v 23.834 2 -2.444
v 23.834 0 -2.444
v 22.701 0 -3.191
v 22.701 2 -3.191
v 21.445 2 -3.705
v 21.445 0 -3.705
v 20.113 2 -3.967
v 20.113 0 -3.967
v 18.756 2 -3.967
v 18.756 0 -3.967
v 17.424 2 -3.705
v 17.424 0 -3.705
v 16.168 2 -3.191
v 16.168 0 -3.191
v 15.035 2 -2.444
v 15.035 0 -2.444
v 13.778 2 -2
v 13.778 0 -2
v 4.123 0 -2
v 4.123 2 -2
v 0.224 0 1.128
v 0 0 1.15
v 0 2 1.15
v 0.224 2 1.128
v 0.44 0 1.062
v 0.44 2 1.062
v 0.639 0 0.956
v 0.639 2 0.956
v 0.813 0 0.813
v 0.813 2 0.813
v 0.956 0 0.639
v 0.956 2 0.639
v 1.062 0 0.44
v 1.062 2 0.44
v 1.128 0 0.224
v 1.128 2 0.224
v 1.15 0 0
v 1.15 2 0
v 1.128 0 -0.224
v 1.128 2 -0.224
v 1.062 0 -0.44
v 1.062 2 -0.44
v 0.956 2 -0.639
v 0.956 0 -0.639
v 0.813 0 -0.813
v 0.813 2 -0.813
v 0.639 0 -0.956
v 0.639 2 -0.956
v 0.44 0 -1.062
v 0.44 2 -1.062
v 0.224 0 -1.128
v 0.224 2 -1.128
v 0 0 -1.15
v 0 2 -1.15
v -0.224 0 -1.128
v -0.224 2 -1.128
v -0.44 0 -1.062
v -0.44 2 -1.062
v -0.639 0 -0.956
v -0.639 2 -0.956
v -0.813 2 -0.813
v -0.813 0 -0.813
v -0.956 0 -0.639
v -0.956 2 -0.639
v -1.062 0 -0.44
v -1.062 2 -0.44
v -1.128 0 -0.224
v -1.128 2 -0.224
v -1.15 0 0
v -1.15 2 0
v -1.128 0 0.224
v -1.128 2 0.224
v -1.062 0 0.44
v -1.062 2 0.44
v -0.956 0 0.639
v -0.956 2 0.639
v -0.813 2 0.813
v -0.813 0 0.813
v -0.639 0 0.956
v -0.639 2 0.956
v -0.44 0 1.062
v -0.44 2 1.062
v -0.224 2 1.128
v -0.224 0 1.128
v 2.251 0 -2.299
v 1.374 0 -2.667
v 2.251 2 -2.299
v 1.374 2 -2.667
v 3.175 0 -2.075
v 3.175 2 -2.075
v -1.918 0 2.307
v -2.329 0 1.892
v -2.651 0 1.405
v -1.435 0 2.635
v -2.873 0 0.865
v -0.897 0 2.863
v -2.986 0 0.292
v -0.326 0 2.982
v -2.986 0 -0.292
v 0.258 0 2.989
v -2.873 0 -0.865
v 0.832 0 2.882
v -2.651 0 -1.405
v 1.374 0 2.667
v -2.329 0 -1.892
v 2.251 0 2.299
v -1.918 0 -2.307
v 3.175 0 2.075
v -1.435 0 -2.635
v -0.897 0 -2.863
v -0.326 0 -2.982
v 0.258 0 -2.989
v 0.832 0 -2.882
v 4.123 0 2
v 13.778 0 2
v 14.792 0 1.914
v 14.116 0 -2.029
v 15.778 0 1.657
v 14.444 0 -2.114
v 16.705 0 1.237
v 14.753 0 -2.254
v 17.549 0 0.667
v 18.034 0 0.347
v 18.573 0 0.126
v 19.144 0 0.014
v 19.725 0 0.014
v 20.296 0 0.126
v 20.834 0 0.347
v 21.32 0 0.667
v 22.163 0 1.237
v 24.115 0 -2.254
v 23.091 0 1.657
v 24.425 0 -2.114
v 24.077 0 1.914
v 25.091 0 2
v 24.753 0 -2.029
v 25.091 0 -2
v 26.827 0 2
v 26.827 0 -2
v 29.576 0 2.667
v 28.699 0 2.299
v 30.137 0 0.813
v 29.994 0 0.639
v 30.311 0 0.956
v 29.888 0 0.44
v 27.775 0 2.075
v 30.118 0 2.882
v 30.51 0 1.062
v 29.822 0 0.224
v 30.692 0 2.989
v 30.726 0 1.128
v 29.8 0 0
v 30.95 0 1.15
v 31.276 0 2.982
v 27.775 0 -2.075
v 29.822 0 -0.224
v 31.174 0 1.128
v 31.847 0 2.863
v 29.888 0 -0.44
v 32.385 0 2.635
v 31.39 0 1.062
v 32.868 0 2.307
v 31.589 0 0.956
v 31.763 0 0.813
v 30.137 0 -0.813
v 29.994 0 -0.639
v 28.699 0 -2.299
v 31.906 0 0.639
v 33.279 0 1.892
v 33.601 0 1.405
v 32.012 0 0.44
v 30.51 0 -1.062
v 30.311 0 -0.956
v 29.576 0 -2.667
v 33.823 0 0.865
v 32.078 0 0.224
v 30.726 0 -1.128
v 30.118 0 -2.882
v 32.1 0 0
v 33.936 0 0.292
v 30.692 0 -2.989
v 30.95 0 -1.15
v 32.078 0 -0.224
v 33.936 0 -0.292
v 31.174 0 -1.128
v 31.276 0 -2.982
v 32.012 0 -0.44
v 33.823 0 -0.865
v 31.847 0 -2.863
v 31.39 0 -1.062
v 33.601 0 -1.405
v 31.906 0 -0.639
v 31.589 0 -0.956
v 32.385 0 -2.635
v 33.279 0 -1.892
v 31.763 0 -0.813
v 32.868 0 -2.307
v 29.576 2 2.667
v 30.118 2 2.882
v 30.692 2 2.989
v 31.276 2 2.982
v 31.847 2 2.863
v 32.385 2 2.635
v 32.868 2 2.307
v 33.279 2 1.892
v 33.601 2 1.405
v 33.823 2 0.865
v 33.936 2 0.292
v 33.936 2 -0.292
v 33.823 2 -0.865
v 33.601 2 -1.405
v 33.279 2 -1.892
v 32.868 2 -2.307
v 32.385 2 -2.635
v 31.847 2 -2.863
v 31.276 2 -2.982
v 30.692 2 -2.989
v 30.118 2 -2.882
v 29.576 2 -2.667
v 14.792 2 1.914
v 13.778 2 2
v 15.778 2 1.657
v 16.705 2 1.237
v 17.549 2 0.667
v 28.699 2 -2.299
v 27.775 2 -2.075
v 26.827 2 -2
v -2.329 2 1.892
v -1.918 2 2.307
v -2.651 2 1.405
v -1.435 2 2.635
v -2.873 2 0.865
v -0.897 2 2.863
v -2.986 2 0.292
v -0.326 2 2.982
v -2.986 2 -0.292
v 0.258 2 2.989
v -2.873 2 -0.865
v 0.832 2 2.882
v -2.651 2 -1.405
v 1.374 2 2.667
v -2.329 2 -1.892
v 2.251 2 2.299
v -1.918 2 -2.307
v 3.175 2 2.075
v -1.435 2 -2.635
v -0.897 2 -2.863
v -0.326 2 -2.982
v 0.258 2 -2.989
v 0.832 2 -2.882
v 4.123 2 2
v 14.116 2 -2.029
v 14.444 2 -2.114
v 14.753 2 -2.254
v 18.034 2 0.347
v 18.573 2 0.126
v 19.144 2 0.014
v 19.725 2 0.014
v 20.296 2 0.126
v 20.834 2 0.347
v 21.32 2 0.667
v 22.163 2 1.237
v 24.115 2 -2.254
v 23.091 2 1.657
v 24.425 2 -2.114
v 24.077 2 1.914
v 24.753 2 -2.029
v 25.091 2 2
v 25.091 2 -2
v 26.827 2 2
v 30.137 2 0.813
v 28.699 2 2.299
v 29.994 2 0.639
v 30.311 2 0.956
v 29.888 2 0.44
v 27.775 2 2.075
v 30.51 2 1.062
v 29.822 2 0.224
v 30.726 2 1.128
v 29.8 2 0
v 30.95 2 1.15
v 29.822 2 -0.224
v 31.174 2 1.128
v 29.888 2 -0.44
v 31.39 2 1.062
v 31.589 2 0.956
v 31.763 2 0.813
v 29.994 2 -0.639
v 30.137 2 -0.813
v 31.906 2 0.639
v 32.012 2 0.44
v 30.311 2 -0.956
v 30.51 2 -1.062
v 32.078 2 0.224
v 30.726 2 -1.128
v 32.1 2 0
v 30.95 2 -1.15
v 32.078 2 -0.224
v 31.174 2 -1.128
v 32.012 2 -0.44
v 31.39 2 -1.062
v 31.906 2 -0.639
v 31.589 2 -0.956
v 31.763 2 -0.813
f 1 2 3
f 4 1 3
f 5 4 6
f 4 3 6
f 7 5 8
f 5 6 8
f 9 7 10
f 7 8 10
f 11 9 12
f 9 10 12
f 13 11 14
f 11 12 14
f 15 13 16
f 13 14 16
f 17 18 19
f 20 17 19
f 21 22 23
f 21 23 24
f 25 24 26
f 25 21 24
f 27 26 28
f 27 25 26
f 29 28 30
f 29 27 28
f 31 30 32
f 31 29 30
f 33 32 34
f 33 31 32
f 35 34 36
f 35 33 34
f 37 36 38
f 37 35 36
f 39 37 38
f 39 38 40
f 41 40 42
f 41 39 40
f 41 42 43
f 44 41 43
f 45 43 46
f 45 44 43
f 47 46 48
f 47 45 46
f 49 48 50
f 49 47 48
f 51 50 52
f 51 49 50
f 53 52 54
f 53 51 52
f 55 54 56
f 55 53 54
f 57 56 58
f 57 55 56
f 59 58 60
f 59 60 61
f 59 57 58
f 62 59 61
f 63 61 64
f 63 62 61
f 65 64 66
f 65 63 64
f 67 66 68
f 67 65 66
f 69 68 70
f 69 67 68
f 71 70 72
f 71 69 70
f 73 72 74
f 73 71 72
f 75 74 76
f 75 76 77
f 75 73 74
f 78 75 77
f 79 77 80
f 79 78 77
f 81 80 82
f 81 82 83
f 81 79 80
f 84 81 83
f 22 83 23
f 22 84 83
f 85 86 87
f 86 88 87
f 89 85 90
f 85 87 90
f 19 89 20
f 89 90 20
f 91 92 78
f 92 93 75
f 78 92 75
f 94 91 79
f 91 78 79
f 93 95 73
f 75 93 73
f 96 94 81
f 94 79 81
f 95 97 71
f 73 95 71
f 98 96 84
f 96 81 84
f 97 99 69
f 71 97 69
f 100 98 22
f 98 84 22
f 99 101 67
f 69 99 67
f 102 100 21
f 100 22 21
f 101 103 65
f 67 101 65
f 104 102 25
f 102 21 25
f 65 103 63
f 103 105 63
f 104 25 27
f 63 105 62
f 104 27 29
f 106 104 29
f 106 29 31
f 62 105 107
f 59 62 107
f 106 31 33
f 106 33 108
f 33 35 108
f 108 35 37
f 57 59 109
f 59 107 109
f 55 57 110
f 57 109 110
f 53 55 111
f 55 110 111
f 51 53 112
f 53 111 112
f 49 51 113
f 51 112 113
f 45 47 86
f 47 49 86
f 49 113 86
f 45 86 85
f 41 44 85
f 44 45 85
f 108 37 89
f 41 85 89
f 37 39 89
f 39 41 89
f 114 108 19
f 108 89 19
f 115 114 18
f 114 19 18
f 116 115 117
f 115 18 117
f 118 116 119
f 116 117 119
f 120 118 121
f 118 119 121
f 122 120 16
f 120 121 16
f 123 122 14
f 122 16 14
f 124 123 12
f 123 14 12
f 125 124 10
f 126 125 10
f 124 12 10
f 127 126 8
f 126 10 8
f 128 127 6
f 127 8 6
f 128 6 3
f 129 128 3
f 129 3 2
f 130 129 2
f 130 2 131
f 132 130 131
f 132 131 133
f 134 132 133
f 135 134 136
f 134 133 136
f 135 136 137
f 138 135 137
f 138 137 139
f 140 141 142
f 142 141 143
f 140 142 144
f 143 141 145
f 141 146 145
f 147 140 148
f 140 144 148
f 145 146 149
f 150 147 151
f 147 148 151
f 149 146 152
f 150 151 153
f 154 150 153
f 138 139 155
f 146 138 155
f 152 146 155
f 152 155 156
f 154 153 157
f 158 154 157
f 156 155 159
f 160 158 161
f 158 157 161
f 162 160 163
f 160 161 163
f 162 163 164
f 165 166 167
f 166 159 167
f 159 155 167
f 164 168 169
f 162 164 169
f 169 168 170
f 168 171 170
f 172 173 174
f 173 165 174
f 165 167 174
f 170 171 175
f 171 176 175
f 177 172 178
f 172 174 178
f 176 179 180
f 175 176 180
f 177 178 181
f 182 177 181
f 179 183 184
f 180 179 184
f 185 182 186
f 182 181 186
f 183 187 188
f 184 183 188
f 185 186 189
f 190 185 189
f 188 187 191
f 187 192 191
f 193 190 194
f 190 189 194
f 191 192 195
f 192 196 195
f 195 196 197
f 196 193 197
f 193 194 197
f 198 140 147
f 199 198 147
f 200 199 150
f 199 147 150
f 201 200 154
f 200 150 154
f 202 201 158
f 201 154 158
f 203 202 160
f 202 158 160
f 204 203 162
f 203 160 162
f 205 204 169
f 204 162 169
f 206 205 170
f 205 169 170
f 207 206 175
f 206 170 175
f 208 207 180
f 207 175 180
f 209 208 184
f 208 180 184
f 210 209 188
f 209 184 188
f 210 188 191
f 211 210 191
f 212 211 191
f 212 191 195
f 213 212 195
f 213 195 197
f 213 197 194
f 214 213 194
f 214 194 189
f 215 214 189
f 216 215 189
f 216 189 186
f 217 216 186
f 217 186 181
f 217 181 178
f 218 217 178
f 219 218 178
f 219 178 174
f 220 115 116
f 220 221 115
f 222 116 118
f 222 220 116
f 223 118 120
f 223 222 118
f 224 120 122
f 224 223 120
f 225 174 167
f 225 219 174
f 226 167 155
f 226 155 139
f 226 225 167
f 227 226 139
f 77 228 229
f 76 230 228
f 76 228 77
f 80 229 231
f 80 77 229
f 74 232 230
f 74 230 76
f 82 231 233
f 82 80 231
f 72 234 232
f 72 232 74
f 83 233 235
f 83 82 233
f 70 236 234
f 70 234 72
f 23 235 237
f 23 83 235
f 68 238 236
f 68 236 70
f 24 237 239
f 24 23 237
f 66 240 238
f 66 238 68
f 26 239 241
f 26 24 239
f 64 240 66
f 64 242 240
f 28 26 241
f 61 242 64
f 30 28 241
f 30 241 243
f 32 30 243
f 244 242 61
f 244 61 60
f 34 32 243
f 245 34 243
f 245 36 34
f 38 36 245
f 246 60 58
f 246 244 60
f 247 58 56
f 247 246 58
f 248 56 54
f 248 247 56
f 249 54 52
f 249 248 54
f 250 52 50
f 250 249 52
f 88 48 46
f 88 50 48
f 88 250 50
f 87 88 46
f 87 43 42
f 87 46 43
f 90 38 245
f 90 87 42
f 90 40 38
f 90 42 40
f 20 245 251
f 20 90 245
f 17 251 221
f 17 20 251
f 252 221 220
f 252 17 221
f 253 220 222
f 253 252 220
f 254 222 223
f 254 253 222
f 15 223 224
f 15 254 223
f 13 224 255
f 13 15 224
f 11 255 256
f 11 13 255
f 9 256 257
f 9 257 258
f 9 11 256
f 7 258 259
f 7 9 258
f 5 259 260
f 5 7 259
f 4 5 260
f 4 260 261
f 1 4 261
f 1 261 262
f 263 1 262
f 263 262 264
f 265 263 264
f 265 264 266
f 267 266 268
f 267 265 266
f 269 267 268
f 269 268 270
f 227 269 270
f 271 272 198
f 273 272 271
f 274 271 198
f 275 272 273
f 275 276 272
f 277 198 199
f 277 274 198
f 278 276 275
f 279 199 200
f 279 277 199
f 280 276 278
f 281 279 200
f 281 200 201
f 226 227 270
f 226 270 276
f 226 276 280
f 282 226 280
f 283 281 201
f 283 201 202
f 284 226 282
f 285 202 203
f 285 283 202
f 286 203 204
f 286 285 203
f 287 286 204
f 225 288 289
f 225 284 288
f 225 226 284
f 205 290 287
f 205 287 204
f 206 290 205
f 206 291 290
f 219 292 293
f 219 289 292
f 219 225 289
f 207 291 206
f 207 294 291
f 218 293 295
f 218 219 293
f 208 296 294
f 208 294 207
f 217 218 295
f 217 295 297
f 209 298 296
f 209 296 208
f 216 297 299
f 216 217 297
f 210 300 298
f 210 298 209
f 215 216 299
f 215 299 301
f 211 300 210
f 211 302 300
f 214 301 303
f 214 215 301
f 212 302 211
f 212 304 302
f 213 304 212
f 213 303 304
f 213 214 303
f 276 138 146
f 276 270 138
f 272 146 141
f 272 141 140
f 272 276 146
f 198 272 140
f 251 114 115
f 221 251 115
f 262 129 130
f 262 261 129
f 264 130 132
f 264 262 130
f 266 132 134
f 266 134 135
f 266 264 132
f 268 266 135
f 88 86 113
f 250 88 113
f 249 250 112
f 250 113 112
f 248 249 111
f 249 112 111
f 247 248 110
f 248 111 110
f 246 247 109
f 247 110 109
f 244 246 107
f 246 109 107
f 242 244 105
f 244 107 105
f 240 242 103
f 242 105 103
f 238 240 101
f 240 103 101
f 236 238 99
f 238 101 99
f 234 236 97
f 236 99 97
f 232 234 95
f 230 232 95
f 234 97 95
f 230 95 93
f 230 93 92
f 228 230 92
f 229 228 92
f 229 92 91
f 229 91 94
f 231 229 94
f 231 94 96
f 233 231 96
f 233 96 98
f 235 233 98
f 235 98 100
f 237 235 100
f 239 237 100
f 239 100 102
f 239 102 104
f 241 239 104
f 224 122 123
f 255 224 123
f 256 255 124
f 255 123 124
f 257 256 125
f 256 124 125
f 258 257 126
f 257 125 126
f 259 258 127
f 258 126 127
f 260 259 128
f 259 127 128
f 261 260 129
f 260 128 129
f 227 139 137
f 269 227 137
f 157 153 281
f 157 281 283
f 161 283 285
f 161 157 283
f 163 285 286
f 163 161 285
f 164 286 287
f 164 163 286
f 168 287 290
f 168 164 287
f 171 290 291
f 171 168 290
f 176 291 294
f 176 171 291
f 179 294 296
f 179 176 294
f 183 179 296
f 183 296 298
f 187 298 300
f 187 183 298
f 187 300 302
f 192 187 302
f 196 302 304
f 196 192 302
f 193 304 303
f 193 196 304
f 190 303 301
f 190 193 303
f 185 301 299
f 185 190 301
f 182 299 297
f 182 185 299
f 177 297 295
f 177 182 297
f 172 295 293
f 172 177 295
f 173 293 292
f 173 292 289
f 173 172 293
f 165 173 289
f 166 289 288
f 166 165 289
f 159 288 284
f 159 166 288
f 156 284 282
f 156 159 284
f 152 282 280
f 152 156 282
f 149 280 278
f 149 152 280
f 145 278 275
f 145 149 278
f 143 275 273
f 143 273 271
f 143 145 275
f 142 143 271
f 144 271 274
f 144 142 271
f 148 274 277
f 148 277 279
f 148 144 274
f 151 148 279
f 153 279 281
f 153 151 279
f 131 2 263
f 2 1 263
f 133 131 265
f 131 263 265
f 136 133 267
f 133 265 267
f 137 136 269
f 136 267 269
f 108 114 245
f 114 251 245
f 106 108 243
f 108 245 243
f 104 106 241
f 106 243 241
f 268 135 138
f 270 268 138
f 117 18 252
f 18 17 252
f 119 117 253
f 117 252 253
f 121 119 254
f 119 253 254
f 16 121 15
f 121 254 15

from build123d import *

# Parameters (mm, degrees)
SKETCH_1_R      = 1.15
EXTRUDE_1_DEPTH = 2
FILLET_1_R      = 6
FILLET_2_R      = 6
FILLET_3_R      = 2


with BuildPart() as part:
    # Эскиз1 → Бобышка-Вытянуть1 (new body)
    with BuildSketch(Plane(origin=(0, 0, 0), x_dir=(1, 0, 0), z_dir=(0, 1, 0))):
        with BuildLine():
            Line((2.236067977, -2), (16.605931339, -2))
            ThreePointArc((16.605931339, -2), (19.434358463, 0), (22.262785588, -2))
            Line((22.262785588, -2), (28.713932023, -2))
            ThreePointArc((28.713932023, -2), (33.95, 0), (28.713932023, 2))
            Line((28.713932023, 2), (24.333337949, 2))
            ThreePointArc((24.333337949, 2), (19.434358463, 4), (14.535378978, 2))
            Line((14.535378978, 2), (2.236067977, 2))
            ThreePointArc((2.236067977, 2), (-3, 0), (2.236067977, -2))
        make_face()
        with Locations(Location((0, 0, 0), (0, 0, 270))):
            Circle(SKETCH_1_R, mode=Mode.SUBTRACT)
        with Locations(Location((30.95, 0, 0), (0, 0, 270))):
            Circle(SKETCH_1_R, mode=Mode.SUBTRACT)
    extrude(amount=EXTRUDE_1_DEPTH)

    # Скругление1
    fillet_1_edges = [part.edges().sort_by_distance(p)[0] for p in [
        (2.236067977, 1, 2),
        (2.236067977, 1, -2),
        (28.713932023, 1, -2),
        (28.713932023, 1, 2),
    ]]
    fillet(fillet_1_edges, radius=FILLET_1_R)

    # Скругление2
    fillet_2_edges = [part.edges().sort_by_distance(p)[0] for p in [
        (22.262785588, 1, 2),
        (16.605931339, 1, 2),
    ]]
    fillet(fillet_2_edges, radius=FILLET_2_R)

    # Скругление3
    fillet_3_edges = [part.edges().sort_by_distance(p)[0] for p in [
        (14.535378978, 1, -2),
        (24.333337949, 1, -2),
    ]]
    fillet(fillet_3_edges, radius=FILLET_3_R)


solid = part.part
